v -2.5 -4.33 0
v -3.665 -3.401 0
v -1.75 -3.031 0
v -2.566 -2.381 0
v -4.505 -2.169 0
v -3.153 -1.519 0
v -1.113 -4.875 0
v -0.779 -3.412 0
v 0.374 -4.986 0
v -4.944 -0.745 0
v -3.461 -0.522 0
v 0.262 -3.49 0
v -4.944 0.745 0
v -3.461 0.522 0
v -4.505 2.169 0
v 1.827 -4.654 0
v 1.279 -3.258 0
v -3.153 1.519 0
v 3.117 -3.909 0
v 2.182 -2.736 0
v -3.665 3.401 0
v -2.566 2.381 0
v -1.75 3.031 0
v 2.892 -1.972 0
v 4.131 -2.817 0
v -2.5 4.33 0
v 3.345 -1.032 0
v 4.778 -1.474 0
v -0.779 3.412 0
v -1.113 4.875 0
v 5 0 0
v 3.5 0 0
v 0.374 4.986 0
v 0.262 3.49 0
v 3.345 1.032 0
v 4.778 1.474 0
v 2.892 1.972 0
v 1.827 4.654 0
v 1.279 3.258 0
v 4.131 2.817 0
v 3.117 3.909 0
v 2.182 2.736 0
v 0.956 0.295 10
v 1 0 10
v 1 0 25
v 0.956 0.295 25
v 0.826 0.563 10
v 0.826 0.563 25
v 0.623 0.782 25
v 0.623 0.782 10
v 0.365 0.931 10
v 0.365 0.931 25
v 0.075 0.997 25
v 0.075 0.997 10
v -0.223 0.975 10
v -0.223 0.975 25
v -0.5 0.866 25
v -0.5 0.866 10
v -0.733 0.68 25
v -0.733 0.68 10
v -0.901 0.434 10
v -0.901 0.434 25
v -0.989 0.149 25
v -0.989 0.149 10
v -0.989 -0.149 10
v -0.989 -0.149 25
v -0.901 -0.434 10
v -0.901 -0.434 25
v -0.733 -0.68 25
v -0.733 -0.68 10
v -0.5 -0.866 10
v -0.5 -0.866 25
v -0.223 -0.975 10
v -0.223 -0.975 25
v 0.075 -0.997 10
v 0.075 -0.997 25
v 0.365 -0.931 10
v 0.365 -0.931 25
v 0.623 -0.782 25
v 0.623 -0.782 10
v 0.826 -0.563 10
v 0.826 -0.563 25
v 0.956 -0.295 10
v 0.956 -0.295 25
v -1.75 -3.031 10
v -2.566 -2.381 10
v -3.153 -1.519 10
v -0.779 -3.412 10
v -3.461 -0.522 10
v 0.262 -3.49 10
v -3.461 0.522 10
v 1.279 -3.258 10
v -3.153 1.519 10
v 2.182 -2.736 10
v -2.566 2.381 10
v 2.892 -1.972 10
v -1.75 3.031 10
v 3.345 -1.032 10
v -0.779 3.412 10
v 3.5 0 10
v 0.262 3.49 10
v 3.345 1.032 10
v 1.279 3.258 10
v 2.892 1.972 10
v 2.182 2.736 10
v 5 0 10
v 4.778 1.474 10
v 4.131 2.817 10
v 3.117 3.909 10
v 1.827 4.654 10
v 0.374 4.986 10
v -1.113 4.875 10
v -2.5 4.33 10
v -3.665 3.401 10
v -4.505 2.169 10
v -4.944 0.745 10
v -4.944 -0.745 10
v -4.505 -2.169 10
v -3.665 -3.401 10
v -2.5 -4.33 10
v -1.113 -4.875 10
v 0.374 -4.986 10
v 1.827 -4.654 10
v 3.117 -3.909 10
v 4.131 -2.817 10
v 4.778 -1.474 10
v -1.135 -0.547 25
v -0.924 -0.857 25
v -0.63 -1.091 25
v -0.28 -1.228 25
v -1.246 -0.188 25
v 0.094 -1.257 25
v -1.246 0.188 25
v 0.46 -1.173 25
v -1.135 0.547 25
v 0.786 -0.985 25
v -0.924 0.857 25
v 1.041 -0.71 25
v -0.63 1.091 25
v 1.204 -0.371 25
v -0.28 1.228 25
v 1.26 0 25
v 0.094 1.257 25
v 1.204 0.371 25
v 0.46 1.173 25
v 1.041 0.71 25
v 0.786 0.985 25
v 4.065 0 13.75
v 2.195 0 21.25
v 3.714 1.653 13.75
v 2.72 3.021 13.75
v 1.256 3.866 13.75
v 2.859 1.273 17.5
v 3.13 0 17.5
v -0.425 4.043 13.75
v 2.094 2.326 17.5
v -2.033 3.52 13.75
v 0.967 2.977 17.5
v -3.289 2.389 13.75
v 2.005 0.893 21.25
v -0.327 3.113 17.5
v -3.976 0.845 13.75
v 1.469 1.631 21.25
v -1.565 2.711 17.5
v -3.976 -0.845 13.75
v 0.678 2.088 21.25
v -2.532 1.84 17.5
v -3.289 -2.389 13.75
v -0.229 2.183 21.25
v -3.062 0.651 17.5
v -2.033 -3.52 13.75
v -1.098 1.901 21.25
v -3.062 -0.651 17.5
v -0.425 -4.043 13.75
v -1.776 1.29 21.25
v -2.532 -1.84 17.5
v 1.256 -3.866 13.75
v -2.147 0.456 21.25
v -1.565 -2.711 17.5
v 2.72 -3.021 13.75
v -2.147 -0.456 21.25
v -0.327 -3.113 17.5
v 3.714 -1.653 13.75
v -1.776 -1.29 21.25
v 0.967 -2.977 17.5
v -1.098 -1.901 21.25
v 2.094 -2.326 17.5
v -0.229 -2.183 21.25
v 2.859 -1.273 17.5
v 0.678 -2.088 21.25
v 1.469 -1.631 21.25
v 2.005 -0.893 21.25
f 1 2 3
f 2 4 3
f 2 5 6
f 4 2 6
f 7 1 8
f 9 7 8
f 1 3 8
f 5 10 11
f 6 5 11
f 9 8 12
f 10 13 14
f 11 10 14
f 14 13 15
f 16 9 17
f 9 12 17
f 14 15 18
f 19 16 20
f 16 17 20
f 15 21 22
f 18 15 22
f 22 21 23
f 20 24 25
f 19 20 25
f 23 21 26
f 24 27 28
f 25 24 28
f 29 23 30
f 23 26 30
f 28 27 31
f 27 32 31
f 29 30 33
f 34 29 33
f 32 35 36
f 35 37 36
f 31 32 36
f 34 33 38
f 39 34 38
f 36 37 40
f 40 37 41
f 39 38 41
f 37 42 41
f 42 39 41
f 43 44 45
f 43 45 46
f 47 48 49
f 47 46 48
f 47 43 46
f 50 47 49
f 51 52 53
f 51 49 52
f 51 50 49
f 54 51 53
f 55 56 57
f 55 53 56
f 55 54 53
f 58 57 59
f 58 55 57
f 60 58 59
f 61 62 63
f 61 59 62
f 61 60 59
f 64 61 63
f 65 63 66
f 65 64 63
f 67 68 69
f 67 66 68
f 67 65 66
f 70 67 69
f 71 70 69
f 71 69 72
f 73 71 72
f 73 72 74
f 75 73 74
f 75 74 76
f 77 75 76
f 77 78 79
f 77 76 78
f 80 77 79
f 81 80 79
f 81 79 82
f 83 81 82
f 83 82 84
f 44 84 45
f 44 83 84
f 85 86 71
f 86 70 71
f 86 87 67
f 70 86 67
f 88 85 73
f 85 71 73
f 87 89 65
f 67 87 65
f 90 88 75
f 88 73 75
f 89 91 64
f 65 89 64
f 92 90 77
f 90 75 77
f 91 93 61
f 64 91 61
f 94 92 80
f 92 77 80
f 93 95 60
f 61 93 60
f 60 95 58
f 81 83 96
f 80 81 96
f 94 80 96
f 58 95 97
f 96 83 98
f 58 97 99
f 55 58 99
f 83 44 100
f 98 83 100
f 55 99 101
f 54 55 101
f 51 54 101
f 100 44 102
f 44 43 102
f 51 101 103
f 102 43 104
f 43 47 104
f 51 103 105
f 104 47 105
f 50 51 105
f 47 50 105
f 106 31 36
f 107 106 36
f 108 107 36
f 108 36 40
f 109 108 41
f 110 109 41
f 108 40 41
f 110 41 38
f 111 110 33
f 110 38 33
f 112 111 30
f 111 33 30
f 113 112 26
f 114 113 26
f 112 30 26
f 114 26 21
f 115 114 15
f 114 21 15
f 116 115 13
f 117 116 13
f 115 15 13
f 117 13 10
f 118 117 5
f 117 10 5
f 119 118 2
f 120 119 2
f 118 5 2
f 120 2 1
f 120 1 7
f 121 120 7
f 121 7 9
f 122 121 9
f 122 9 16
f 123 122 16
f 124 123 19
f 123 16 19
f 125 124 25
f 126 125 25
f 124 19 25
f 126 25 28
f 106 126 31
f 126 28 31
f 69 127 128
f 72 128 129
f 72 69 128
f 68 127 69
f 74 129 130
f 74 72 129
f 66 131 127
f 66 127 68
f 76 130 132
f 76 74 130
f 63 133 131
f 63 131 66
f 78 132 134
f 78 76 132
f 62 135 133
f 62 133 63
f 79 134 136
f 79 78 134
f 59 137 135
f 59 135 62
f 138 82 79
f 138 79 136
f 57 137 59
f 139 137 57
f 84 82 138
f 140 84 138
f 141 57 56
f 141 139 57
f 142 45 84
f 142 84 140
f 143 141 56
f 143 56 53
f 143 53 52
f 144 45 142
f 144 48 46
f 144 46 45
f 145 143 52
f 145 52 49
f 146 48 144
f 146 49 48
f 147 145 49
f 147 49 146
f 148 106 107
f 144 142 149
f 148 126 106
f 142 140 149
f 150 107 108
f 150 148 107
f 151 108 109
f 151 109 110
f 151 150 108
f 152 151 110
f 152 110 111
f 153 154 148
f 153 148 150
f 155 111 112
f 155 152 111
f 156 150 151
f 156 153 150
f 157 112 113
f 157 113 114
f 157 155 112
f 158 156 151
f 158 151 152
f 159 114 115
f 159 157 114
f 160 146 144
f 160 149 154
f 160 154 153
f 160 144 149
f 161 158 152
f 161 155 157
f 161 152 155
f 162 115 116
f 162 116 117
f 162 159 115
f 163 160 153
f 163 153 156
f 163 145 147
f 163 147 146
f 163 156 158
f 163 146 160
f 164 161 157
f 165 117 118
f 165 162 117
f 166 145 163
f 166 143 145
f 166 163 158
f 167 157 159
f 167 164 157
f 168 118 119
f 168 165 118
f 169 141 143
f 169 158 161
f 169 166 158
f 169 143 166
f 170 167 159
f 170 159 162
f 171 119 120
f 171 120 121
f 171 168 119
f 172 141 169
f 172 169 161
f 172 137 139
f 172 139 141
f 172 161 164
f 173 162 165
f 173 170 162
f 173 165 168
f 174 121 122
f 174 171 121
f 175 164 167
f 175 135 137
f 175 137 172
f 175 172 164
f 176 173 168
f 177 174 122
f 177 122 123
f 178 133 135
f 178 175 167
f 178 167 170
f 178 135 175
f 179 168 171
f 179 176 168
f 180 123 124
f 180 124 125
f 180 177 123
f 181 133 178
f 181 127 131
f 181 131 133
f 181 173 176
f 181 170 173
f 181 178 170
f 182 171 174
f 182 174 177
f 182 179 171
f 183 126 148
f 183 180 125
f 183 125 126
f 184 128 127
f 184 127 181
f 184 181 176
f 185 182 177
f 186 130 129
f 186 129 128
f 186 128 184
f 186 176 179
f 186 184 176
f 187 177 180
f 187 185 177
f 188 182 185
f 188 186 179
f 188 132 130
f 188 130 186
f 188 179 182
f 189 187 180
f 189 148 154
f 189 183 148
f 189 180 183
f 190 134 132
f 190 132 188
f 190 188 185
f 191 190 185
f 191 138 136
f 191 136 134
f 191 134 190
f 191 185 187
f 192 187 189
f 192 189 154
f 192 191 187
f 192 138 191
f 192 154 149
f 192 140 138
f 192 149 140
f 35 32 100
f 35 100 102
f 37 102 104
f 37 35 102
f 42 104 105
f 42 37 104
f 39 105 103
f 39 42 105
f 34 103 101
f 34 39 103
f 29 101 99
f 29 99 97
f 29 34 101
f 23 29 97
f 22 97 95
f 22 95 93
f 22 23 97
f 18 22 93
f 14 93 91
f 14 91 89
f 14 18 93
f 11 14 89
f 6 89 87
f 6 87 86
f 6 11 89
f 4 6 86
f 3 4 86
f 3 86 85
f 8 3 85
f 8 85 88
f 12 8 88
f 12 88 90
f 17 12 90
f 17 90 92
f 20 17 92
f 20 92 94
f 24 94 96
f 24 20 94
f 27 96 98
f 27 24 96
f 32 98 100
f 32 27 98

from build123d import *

# Parameters (mm, degrees)
F0_R     = 5
F0_R_2   = 3.5
F1_DEPTH = 10
F2_R     = 5
F3_DEPTH = 15
F3_TAPER = 14
F0_R_3   = 1
F4_DEPTH = 25.001


with BuildPart() as f1:
    # F0 (on Top) → F1 (new body)
    with BuildSketch(Plane.XY):
        Circle(F0_R)
        Circle(F0_R_2, mode=Mode.SUBTRACT)
    extrude(amount=F1_DEPTH)

    # F2 (on face) → F3 (join)
    with BuildSketch(Plane.XY.offset(10)):
        Circle(F2_R)
    extrude(amount=F3_DEPTH, taper=F3_TAPER)

    # F0 (on Top) → F4 (cut, through all)
    with BuildSketch(Plane.XY):
        Circle(F0_R_3)
    extrude(amount=F4_DEPTH, mode=Mode.SUBTRACT)


solid = f1.part
